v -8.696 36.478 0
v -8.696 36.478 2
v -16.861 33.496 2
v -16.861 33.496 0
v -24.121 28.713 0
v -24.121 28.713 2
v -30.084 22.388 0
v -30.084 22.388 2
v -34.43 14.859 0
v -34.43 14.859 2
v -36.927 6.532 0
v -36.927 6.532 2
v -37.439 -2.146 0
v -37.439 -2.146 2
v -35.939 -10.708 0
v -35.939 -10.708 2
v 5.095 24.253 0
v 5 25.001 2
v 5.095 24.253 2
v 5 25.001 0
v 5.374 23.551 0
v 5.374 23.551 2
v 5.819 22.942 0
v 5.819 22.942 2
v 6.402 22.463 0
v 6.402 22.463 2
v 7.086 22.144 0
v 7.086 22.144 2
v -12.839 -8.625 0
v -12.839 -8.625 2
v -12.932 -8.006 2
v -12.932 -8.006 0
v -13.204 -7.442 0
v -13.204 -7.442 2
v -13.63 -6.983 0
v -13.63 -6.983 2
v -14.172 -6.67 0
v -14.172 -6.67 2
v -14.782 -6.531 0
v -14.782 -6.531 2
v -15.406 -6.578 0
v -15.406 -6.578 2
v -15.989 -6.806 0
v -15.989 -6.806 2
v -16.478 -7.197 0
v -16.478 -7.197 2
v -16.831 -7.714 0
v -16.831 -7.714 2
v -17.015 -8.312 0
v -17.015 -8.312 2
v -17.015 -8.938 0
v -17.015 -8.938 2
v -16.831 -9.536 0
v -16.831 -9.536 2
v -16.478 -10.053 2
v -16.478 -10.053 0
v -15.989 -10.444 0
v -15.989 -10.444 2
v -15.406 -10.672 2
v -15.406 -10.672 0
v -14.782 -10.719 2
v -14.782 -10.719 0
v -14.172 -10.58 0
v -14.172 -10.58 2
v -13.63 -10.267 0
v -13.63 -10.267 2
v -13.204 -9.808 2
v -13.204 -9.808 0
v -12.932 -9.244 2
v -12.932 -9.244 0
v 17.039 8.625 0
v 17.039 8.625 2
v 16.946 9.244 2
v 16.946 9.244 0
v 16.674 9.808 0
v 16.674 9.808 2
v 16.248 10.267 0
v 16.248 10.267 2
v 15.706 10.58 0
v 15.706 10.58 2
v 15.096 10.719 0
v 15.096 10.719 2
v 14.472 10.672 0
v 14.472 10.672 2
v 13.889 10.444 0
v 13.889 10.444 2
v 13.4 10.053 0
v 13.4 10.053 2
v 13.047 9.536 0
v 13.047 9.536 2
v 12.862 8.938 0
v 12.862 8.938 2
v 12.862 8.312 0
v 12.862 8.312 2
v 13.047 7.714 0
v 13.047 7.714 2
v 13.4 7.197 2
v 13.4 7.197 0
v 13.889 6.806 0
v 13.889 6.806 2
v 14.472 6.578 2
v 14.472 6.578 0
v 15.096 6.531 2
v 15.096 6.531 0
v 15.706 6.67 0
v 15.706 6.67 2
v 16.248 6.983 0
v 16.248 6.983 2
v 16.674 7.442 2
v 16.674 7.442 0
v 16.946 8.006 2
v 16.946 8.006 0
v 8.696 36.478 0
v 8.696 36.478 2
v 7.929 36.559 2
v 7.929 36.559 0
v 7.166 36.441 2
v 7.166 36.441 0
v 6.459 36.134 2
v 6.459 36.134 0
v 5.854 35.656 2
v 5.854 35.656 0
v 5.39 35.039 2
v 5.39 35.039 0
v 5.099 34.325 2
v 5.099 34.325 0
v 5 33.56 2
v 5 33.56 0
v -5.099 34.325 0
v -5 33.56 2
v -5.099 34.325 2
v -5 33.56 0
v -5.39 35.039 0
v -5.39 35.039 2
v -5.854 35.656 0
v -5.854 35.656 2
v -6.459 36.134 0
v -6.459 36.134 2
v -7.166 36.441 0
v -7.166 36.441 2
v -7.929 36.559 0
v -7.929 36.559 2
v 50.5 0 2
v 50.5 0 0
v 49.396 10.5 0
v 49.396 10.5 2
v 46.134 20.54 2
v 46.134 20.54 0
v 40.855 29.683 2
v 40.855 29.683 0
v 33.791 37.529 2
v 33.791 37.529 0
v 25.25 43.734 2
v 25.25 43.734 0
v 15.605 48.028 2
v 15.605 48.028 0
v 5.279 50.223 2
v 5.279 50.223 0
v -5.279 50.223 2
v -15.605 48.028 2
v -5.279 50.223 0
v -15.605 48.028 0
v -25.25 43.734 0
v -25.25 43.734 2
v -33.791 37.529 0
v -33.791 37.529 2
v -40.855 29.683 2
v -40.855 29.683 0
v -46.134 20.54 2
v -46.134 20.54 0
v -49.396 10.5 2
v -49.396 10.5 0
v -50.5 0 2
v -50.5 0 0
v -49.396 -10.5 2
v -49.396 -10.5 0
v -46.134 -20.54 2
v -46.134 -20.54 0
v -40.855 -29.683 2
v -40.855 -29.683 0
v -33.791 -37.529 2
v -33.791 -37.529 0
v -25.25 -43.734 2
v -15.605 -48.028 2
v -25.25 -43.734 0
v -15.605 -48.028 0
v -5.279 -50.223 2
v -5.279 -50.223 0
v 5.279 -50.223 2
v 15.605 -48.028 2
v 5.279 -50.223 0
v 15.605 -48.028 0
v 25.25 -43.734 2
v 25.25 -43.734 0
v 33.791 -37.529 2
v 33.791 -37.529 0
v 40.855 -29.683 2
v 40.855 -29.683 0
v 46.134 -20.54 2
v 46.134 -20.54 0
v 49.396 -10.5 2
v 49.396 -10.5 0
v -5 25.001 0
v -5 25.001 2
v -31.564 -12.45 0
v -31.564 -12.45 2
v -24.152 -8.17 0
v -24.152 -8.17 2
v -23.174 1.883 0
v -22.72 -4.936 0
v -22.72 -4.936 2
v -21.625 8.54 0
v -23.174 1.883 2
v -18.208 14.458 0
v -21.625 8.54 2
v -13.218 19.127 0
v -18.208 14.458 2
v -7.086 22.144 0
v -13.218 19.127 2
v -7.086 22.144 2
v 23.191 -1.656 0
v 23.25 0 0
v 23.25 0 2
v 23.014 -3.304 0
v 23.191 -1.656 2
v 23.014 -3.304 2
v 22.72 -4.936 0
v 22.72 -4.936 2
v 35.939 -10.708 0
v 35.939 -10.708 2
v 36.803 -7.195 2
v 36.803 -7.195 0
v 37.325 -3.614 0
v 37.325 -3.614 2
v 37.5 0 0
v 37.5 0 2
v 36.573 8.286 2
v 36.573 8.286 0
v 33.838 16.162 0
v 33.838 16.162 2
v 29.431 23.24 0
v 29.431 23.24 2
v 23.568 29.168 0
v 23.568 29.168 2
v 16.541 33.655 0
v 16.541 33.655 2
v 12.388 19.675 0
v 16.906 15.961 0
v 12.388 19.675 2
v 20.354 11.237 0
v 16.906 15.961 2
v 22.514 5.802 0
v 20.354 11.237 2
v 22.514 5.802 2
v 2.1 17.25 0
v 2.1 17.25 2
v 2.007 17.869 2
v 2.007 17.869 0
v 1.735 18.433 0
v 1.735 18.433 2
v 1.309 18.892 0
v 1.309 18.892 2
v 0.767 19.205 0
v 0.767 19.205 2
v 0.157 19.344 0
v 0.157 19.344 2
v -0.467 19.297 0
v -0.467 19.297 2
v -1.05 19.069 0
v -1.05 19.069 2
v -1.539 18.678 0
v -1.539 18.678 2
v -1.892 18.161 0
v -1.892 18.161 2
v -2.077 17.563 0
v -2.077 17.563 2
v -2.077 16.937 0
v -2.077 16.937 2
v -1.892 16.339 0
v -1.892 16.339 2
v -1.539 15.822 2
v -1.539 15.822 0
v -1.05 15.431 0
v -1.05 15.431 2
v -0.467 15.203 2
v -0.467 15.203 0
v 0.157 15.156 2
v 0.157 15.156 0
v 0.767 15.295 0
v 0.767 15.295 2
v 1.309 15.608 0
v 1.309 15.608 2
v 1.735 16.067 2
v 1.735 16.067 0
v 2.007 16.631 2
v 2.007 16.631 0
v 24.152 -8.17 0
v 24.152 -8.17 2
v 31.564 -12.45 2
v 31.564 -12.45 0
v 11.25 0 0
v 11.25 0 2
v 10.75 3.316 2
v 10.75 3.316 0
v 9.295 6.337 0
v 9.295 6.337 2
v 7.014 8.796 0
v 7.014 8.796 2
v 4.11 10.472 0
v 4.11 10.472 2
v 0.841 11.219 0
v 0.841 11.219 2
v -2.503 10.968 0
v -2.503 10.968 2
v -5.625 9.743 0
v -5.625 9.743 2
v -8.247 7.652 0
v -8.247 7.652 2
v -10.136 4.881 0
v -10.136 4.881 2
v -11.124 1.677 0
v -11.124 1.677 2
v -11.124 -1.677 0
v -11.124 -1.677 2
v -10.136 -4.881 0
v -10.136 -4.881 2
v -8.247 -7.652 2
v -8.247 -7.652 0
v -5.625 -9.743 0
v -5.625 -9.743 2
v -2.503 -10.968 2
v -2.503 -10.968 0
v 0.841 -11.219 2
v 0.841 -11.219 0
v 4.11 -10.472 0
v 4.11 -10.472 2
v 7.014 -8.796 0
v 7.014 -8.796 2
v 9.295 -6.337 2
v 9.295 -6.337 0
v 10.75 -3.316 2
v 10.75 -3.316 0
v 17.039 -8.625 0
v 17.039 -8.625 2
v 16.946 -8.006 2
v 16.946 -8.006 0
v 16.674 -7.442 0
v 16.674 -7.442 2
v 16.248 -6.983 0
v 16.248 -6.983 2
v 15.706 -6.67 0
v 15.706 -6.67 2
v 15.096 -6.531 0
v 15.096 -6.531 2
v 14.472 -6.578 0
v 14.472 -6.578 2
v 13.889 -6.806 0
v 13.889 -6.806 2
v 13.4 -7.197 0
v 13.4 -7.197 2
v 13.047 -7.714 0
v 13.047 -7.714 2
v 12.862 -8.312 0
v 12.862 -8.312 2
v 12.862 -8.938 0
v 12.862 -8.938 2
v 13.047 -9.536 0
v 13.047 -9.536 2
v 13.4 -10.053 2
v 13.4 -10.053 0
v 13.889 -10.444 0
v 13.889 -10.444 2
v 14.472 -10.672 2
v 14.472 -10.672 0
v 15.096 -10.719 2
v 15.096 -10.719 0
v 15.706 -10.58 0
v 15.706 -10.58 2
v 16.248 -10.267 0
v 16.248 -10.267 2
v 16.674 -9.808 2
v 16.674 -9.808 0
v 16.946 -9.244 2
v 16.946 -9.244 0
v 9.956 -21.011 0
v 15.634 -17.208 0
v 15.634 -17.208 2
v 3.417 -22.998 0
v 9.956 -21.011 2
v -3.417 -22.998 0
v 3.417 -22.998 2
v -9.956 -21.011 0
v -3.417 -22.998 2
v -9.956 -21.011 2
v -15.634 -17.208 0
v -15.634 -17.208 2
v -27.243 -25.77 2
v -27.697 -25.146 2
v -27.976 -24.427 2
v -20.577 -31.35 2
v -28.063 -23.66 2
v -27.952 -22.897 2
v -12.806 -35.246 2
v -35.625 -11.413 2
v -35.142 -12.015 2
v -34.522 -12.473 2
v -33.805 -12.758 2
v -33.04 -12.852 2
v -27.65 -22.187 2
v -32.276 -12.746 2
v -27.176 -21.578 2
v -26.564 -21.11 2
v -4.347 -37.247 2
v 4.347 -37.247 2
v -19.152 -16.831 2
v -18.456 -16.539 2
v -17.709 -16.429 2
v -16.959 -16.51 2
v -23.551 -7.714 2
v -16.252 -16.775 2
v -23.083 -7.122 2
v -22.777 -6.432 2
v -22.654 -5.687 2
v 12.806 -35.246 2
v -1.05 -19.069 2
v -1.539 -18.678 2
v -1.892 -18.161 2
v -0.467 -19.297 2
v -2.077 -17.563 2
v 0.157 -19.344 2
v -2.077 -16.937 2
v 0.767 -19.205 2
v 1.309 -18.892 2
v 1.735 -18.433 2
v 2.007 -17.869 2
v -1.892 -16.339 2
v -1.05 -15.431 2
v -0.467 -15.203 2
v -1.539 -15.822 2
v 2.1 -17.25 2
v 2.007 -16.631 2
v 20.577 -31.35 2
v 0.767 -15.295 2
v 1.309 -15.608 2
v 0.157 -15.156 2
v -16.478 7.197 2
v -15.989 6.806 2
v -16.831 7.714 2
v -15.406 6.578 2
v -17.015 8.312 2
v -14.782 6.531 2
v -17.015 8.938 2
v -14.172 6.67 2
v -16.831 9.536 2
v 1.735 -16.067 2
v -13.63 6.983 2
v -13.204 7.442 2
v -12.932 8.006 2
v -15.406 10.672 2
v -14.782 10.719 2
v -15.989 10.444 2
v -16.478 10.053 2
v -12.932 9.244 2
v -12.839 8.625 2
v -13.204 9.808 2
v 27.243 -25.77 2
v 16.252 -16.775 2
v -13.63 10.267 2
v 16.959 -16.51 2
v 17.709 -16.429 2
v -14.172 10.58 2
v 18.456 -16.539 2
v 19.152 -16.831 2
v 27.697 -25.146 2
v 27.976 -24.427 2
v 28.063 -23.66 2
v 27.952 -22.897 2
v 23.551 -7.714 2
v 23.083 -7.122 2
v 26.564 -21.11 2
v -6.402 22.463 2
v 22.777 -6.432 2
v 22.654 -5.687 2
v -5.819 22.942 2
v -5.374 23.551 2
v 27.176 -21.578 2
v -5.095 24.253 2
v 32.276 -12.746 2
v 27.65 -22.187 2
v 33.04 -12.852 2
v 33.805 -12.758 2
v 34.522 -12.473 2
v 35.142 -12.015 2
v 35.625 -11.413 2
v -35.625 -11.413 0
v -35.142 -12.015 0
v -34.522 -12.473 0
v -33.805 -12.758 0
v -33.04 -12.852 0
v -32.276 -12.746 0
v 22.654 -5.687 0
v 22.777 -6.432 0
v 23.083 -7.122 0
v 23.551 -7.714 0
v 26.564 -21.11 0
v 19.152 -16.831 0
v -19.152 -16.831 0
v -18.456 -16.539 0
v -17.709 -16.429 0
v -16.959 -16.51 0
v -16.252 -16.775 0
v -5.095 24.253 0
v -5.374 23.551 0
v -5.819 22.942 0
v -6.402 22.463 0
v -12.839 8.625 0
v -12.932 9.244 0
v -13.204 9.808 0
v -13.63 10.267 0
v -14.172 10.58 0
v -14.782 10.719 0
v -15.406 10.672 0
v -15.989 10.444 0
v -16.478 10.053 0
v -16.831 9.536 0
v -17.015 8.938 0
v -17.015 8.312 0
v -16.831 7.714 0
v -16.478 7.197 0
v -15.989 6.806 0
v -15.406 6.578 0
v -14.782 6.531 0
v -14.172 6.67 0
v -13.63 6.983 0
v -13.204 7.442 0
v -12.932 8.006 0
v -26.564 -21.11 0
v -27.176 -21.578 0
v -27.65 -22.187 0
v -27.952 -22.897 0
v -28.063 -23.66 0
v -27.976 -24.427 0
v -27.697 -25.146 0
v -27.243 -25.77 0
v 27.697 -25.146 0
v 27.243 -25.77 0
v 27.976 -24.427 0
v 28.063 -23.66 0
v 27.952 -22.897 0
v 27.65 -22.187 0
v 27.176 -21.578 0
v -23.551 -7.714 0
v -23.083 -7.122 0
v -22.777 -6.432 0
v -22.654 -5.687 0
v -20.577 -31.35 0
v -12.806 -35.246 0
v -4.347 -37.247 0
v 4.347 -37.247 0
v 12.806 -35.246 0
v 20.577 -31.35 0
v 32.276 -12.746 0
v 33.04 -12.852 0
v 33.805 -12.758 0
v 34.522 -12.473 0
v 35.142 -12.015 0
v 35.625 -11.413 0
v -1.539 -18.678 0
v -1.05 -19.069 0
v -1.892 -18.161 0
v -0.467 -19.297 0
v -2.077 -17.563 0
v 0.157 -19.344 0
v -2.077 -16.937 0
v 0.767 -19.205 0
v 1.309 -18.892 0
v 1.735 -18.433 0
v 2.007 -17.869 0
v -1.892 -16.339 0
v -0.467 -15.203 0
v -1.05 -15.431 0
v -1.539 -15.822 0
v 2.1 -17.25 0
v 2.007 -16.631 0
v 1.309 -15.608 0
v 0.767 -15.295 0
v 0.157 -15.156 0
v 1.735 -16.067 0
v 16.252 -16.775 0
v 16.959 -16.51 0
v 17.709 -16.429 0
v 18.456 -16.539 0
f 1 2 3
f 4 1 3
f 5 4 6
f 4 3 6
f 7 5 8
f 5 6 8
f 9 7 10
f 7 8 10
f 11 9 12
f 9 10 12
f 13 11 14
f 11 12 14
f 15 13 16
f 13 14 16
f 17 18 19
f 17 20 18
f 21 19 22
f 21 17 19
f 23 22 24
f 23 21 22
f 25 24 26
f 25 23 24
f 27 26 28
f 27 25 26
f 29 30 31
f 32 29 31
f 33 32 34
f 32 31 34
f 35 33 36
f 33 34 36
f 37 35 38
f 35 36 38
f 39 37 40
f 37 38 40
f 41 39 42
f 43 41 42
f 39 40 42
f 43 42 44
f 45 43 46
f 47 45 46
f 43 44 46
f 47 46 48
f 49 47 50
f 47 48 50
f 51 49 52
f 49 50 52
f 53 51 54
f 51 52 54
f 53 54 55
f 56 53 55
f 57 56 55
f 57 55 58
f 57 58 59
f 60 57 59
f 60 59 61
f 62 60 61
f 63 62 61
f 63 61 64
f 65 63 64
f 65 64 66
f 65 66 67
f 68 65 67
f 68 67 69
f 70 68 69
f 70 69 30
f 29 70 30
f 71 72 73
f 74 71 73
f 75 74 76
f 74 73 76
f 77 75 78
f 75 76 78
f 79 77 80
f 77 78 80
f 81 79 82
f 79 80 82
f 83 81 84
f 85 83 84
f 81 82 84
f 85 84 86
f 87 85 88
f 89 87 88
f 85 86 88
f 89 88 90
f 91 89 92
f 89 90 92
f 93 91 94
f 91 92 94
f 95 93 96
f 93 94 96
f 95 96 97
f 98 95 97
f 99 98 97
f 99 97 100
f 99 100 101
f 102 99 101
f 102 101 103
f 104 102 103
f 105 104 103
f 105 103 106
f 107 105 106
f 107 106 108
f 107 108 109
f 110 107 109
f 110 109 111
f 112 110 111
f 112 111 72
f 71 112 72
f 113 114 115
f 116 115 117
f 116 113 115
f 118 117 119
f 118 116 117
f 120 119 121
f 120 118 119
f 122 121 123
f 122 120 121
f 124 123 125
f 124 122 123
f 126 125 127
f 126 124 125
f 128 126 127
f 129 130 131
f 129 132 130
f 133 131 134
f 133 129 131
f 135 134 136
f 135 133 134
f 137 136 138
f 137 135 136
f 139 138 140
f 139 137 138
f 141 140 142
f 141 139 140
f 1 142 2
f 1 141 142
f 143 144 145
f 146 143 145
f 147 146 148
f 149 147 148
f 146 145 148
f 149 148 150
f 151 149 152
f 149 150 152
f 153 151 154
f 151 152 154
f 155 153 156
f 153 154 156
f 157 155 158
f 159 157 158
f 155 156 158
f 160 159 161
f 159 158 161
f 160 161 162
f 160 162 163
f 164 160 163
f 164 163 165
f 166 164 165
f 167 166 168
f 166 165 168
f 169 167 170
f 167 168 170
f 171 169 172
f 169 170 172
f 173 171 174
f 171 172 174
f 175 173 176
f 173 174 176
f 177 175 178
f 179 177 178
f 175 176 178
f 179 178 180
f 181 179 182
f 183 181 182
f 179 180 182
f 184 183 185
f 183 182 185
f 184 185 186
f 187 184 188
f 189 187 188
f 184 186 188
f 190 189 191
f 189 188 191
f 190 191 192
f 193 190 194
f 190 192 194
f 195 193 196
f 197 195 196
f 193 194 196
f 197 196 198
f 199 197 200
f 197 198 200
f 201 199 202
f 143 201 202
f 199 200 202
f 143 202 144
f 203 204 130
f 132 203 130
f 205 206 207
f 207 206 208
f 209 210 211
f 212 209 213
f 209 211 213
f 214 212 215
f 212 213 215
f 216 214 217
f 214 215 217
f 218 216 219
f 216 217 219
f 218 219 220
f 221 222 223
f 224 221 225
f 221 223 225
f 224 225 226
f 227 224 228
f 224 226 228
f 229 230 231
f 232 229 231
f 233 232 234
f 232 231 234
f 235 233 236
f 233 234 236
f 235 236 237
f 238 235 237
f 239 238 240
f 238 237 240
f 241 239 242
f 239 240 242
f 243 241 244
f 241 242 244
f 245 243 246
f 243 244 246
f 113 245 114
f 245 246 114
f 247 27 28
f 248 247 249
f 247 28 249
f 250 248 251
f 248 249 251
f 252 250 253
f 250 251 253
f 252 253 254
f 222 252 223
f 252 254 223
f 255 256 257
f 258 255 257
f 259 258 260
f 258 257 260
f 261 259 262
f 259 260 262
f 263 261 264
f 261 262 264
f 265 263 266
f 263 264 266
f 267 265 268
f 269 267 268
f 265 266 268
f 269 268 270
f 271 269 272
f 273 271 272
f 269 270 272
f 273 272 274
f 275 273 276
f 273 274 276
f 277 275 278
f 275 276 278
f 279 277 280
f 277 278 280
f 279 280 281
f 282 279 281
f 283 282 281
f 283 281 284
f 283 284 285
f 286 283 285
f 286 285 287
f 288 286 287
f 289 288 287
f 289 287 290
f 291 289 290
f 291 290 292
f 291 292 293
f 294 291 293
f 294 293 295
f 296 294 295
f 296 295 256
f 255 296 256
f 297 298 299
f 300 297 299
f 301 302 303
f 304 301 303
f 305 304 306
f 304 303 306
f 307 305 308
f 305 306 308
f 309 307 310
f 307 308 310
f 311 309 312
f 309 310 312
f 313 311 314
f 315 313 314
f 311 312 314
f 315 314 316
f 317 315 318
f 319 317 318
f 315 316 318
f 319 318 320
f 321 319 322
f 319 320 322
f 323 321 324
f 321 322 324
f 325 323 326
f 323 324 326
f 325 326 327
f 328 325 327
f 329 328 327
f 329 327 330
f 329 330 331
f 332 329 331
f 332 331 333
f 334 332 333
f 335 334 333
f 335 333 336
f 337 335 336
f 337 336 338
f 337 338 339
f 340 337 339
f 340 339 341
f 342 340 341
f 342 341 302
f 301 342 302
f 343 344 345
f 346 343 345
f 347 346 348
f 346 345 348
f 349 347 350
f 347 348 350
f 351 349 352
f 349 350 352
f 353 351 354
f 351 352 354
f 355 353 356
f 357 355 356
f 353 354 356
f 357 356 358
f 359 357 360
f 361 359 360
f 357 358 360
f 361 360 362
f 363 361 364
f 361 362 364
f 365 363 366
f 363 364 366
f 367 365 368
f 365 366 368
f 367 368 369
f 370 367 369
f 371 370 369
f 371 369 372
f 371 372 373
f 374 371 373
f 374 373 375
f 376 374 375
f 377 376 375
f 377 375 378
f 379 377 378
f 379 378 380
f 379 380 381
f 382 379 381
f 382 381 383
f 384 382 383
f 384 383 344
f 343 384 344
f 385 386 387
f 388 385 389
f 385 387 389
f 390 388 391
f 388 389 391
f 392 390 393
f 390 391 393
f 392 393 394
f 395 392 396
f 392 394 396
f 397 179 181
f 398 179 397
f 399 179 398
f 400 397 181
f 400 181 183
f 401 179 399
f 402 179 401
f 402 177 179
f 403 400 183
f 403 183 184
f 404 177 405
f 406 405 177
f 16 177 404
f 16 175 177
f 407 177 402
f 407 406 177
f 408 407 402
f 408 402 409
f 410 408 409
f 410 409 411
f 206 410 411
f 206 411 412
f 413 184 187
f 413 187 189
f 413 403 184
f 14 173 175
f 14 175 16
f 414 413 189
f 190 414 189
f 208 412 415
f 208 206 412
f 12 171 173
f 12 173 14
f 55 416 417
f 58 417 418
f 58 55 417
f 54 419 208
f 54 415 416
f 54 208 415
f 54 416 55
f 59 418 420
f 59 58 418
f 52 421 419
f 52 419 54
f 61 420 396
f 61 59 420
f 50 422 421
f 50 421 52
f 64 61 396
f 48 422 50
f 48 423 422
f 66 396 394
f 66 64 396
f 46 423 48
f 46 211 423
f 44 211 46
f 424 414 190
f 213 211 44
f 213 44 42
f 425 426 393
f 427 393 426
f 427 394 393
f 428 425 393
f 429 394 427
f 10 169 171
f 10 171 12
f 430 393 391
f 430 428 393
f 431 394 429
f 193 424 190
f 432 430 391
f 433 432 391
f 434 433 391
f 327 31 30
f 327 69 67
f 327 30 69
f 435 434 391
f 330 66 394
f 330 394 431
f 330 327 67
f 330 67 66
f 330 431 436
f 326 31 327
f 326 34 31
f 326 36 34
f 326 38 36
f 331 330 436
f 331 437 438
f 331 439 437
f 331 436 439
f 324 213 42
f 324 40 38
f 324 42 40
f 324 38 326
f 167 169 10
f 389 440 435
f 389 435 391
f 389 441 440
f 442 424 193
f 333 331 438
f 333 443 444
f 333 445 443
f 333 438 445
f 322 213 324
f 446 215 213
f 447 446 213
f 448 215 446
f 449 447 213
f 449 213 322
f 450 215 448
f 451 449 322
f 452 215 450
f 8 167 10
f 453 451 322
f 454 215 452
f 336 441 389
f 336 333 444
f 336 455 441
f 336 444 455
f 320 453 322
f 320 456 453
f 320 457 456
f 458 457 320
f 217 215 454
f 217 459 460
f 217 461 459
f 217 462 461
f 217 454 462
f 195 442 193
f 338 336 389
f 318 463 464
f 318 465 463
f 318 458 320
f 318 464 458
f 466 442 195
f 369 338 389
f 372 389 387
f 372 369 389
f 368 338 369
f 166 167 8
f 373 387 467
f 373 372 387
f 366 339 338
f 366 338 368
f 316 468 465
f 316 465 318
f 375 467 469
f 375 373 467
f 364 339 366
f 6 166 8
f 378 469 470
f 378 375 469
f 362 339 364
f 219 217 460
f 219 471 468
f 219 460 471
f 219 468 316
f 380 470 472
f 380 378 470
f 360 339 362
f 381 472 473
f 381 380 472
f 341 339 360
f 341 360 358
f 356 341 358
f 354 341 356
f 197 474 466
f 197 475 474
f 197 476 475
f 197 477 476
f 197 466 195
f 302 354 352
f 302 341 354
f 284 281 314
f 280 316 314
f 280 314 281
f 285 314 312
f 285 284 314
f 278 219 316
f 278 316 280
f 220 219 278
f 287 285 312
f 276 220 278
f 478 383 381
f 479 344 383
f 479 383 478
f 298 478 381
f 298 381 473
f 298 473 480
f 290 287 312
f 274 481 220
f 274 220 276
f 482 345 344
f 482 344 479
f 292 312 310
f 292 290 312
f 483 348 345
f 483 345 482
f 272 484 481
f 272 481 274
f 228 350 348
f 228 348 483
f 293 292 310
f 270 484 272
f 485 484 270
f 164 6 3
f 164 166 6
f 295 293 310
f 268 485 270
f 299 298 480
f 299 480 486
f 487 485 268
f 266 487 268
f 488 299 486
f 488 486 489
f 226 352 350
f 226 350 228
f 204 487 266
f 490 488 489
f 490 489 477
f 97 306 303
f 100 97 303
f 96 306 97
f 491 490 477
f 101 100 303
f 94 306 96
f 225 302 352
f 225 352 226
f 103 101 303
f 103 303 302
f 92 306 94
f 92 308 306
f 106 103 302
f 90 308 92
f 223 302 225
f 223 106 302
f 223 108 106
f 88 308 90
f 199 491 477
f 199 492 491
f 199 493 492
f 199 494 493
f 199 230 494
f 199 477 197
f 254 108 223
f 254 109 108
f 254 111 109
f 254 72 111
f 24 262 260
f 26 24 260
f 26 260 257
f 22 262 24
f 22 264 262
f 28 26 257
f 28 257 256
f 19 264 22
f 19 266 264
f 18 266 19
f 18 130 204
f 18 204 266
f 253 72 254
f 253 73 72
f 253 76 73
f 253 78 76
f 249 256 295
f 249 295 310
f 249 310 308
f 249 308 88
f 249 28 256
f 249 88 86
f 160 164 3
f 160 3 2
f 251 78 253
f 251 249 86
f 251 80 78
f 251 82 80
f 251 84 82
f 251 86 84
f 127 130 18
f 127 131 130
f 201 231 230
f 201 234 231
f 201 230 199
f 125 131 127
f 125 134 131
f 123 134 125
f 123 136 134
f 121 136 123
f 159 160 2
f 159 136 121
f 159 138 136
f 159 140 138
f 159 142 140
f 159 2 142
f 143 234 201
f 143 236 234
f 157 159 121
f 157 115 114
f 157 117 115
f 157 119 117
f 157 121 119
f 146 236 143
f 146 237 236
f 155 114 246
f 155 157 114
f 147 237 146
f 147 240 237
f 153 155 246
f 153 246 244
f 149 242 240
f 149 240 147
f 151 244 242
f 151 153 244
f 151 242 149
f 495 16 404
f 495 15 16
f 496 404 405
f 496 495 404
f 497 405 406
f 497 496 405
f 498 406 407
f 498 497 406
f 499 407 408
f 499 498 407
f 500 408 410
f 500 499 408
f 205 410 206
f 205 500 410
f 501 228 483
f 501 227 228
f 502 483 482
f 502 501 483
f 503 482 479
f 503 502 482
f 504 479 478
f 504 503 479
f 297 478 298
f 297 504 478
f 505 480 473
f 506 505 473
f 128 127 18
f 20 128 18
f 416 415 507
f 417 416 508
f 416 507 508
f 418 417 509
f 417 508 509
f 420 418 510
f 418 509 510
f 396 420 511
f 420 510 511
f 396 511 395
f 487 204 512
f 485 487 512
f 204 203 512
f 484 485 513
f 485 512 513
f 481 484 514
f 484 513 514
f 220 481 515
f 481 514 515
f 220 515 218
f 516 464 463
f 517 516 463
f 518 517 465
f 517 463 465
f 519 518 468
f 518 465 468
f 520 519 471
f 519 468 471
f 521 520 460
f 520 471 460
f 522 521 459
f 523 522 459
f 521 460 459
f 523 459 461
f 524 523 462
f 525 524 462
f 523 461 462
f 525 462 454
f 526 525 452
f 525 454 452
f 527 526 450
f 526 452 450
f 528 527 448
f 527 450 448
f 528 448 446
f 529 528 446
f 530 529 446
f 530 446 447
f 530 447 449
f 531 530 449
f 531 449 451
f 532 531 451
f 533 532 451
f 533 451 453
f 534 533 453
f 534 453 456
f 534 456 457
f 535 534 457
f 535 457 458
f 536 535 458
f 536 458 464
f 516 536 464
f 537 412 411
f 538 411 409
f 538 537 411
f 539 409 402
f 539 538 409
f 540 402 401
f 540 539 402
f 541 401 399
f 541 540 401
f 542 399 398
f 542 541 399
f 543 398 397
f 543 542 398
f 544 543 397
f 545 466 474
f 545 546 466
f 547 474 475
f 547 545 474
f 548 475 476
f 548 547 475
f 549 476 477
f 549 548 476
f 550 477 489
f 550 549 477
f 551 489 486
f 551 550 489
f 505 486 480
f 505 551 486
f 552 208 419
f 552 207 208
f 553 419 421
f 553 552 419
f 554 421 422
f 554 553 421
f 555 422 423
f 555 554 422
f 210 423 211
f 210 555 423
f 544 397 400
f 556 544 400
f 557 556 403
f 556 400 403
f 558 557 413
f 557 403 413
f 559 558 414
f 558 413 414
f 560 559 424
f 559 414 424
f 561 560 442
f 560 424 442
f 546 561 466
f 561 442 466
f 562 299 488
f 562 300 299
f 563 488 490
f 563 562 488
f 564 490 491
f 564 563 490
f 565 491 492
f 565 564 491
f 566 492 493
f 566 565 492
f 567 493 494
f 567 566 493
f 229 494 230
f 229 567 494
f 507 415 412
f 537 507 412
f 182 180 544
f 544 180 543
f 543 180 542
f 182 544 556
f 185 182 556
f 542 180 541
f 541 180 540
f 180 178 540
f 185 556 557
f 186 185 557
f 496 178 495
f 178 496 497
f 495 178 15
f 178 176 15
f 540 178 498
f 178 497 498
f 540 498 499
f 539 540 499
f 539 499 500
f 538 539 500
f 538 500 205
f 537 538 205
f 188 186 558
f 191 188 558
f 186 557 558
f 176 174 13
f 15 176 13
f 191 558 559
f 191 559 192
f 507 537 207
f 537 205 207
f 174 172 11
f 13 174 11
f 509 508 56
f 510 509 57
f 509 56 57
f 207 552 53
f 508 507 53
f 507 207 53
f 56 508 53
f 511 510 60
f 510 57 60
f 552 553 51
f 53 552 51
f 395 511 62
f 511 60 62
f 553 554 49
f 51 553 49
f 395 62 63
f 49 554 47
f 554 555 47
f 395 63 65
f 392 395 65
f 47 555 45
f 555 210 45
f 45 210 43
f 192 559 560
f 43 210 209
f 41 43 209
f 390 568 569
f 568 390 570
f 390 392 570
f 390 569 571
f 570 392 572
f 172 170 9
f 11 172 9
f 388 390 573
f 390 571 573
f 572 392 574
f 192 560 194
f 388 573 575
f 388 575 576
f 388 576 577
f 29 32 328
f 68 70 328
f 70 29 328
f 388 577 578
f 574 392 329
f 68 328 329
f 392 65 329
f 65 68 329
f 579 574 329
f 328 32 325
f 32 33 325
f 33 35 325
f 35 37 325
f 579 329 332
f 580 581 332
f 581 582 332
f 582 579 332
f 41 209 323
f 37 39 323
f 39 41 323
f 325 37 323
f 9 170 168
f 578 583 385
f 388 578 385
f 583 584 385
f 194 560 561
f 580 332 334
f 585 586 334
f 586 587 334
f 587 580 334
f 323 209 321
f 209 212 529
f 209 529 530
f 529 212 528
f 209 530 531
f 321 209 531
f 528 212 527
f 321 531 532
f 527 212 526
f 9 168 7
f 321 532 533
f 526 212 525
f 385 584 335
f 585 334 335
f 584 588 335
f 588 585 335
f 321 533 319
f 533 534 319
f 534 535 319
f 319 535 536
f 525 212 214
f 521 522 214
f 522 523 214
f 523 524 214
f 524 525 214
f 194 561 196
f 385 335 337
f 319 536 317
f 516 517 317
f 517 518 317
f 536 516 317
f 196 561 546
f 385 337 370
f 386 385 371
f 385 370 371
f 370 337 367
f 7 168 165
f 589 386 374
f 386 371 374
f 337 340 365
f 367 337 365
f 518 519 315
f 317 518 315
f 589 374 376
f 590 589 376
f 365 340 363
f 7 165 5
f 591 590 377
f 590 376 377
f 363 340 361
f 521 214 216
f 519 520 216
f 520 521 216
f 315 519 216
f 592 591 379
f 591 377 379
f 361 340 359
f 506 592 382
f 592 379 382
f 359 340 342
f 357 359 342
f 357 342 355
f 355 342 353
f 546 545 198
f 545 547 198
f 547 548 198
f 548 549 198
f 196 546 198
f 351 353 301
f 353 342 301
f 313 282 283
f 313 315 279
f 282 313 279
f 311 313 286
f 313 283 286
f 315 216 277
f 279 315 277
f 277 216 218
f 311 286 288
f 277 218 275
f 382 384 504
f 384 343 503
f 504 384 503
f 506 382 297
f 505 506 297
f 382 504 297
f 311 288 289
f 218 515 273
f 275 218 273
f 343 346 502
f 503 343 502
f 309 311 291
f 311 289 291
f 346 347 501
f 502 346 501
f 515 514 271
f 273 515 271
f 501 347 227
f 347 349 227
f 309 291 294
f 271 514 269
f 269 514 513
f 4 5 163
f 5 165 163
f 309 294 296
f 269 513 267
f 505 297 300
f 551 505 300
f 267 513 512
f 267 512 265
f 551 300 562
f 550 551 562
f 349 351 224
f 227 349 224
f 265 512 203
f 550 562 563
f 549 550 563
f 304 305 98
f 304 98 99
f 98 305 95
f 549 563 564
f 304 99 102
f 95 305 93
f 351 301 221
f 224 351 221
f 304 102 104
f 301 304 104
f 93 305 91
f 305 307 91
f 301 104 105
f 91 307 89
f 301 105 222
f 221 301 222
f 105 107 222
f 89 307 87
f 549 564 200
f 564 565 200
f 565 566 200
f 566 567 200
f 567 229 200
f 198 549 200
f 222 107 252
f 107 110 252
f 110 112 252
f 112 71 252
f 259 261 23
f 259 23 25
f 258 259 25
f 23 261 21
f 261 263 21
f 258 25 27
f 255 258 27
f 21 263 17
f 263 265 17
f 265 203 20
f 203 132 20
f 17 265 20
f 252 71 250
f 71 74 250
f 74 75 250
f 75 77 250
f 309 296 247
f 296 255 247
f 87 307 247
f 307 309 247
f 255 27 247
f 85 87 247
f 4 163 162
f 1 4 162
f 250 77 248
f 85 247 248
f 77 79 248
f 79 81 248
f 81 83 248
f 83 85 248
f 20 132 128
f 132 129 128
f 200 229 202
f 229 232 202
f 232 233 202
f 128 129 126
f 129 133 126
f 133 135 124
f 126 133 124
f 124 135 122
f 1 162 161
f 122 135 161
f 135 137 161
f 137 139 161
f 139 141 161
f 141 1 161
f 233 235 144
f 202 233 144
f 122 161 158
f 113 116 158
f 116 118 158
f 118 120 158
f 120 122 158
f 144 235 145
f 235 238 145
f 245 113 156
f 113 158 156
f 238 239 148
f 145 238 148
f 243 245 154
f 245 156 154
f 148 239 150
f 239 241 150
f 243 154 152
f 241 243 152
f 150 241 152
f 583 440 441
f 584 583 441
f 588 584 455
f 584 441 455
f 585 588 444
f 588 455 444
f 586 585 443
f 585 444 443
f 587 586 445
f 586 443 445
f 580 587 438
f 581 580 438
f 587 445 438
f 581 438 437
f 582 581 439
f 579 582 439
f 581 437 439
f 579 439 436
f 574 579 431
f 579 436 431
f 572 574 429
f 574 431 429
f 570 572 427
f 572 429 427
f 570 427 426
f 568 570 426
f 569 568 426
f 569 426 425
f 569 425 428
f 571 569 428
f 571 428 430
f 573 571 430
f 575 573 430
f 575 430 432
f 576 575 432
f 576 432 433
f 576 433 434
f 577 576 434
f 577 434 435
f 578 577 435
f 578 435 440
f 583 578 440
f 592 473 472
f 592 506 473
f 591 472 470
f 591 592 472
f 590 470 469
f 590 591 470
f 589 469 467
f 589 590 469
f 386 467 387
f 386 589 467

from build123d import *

# Parameters (mm, degrees)
SKETCH_1_R          = 50.5
EXTRUDE_1_DEPTH     = 2
SKETCH_2_R          = 11.25
SKETCH_2_R_2        = 2.1
CUT_EXTRUDE_1_DEPTH = 10
FILLET_1_R          = 3


with BuildPart() as part:
    # 草图1 → 凸台-拉伸1 (new body)
    with BuildSketch(Plane.XY):
        Circle(SKETCH_1_R)
    extrude(amount=EXTRUDE_1_DEPTH)

    # 草图2 → 切除-拉伸1 (cut)
    with BuildSketch(Plane.XY.offset(2)):
        with BuildLine():
            Line((-5, 22.706001409), (-5, 37.165171868))
            ThreePointArc((-5, 37.165171868), (-32.475952642, 18.75), (-34.685982974, -14.252458915))
            Line((-34.685982974, -14.252458915), (-22.163974039, -7.022873686))
            ThreePointArc((-22.163974039, -7.022873686), (-20.135090638, 11.625), (-5, 22.706001409))
        make_face()
        with BuildLine():
            ThreePointArc((37.5, 0), (28.228974477, 24.685522073), (5, 37.165171868))
            Line((5, 37.165171868), (5, 22.706001409))
            ThreePointArc((5, 22.706001409), (18.121982507, 14.565584437), (23.25, 0))
            ThreePointArc((23.25, 0), (22.976889437, -3.55317489), (22.163974039, -7.022873686))
            Line((22.163974039, -7.022873686), (34.685982974, -14.252458915))
            ThreePointArc((34.685982974, -14.252458915), (36.789770056, -7.263801982), (37.5, 0))
        make_face()
        with BuildLine():
            Line((-17.163974039, -15.683127724), (-29.685982974, -22.912712953))
            ThreePointArc((-29.685982974, -22.912712953), (0, -37.5), (29.685982974, -22.912712953))
            Line((29.685982974, -22.912712953), (17.163974039, -15.683127724))
            ThreePointArc((17.163974039, -15.683127724), (0, -23.25), (-17.163974039, -15.683127724))
        make_face()
        Circle(SKETCH_2_R)
        with Locations((-14.938938215, -8.625)):
            Circle(SKETCH_2_R_2)
        with Locations((-14.938938215, 8.625)):
            Circle(SKETCH_2_R_2)
        with Locations((0, 17.25)):
            Circle(SKETCH_2_R_2)
        with Locations((14.938938215, 8.625)):
            Circle(SKETCH_2_R_2)
        with Locations((14.938938215, -8.625)):
            Circle(SKETCH_2_R_2)
        with Locations((0, -17.25)):
            Circle(SKETCH_2_R_2)
    extrude(amount=-CUT_EXTRUDE_1_DEPTH, mode=Mode.SUBTRACT)

    # 圆角1
    fillet_1_edges = [part.edges().sort_by_distance(p)[0] for p in [
        (34.685982974, -14.252458915, 1),
        (22.163974039, -7.022873686, 1),
        (5, 22.706001409, 1),
        (5, 37.165171868, 1),
        (-29.685982974, -22.912712953, 1),
        (-17.163974039, -15.683127724, 1),
        (17.163974039, -15.683127724, 1),
        (29.685982974, -22.912712953, 1),
        (-5, 37.165171868, 1),
        (-5, 22.706001409, 1),
        (-22.163974039, -7.022873686, 1),
        (-34.685982974, -14.252458915, 1),
    ]]
    fillet(fillet_1_edges, radius=FILLET_1_R)


solid = part.part
